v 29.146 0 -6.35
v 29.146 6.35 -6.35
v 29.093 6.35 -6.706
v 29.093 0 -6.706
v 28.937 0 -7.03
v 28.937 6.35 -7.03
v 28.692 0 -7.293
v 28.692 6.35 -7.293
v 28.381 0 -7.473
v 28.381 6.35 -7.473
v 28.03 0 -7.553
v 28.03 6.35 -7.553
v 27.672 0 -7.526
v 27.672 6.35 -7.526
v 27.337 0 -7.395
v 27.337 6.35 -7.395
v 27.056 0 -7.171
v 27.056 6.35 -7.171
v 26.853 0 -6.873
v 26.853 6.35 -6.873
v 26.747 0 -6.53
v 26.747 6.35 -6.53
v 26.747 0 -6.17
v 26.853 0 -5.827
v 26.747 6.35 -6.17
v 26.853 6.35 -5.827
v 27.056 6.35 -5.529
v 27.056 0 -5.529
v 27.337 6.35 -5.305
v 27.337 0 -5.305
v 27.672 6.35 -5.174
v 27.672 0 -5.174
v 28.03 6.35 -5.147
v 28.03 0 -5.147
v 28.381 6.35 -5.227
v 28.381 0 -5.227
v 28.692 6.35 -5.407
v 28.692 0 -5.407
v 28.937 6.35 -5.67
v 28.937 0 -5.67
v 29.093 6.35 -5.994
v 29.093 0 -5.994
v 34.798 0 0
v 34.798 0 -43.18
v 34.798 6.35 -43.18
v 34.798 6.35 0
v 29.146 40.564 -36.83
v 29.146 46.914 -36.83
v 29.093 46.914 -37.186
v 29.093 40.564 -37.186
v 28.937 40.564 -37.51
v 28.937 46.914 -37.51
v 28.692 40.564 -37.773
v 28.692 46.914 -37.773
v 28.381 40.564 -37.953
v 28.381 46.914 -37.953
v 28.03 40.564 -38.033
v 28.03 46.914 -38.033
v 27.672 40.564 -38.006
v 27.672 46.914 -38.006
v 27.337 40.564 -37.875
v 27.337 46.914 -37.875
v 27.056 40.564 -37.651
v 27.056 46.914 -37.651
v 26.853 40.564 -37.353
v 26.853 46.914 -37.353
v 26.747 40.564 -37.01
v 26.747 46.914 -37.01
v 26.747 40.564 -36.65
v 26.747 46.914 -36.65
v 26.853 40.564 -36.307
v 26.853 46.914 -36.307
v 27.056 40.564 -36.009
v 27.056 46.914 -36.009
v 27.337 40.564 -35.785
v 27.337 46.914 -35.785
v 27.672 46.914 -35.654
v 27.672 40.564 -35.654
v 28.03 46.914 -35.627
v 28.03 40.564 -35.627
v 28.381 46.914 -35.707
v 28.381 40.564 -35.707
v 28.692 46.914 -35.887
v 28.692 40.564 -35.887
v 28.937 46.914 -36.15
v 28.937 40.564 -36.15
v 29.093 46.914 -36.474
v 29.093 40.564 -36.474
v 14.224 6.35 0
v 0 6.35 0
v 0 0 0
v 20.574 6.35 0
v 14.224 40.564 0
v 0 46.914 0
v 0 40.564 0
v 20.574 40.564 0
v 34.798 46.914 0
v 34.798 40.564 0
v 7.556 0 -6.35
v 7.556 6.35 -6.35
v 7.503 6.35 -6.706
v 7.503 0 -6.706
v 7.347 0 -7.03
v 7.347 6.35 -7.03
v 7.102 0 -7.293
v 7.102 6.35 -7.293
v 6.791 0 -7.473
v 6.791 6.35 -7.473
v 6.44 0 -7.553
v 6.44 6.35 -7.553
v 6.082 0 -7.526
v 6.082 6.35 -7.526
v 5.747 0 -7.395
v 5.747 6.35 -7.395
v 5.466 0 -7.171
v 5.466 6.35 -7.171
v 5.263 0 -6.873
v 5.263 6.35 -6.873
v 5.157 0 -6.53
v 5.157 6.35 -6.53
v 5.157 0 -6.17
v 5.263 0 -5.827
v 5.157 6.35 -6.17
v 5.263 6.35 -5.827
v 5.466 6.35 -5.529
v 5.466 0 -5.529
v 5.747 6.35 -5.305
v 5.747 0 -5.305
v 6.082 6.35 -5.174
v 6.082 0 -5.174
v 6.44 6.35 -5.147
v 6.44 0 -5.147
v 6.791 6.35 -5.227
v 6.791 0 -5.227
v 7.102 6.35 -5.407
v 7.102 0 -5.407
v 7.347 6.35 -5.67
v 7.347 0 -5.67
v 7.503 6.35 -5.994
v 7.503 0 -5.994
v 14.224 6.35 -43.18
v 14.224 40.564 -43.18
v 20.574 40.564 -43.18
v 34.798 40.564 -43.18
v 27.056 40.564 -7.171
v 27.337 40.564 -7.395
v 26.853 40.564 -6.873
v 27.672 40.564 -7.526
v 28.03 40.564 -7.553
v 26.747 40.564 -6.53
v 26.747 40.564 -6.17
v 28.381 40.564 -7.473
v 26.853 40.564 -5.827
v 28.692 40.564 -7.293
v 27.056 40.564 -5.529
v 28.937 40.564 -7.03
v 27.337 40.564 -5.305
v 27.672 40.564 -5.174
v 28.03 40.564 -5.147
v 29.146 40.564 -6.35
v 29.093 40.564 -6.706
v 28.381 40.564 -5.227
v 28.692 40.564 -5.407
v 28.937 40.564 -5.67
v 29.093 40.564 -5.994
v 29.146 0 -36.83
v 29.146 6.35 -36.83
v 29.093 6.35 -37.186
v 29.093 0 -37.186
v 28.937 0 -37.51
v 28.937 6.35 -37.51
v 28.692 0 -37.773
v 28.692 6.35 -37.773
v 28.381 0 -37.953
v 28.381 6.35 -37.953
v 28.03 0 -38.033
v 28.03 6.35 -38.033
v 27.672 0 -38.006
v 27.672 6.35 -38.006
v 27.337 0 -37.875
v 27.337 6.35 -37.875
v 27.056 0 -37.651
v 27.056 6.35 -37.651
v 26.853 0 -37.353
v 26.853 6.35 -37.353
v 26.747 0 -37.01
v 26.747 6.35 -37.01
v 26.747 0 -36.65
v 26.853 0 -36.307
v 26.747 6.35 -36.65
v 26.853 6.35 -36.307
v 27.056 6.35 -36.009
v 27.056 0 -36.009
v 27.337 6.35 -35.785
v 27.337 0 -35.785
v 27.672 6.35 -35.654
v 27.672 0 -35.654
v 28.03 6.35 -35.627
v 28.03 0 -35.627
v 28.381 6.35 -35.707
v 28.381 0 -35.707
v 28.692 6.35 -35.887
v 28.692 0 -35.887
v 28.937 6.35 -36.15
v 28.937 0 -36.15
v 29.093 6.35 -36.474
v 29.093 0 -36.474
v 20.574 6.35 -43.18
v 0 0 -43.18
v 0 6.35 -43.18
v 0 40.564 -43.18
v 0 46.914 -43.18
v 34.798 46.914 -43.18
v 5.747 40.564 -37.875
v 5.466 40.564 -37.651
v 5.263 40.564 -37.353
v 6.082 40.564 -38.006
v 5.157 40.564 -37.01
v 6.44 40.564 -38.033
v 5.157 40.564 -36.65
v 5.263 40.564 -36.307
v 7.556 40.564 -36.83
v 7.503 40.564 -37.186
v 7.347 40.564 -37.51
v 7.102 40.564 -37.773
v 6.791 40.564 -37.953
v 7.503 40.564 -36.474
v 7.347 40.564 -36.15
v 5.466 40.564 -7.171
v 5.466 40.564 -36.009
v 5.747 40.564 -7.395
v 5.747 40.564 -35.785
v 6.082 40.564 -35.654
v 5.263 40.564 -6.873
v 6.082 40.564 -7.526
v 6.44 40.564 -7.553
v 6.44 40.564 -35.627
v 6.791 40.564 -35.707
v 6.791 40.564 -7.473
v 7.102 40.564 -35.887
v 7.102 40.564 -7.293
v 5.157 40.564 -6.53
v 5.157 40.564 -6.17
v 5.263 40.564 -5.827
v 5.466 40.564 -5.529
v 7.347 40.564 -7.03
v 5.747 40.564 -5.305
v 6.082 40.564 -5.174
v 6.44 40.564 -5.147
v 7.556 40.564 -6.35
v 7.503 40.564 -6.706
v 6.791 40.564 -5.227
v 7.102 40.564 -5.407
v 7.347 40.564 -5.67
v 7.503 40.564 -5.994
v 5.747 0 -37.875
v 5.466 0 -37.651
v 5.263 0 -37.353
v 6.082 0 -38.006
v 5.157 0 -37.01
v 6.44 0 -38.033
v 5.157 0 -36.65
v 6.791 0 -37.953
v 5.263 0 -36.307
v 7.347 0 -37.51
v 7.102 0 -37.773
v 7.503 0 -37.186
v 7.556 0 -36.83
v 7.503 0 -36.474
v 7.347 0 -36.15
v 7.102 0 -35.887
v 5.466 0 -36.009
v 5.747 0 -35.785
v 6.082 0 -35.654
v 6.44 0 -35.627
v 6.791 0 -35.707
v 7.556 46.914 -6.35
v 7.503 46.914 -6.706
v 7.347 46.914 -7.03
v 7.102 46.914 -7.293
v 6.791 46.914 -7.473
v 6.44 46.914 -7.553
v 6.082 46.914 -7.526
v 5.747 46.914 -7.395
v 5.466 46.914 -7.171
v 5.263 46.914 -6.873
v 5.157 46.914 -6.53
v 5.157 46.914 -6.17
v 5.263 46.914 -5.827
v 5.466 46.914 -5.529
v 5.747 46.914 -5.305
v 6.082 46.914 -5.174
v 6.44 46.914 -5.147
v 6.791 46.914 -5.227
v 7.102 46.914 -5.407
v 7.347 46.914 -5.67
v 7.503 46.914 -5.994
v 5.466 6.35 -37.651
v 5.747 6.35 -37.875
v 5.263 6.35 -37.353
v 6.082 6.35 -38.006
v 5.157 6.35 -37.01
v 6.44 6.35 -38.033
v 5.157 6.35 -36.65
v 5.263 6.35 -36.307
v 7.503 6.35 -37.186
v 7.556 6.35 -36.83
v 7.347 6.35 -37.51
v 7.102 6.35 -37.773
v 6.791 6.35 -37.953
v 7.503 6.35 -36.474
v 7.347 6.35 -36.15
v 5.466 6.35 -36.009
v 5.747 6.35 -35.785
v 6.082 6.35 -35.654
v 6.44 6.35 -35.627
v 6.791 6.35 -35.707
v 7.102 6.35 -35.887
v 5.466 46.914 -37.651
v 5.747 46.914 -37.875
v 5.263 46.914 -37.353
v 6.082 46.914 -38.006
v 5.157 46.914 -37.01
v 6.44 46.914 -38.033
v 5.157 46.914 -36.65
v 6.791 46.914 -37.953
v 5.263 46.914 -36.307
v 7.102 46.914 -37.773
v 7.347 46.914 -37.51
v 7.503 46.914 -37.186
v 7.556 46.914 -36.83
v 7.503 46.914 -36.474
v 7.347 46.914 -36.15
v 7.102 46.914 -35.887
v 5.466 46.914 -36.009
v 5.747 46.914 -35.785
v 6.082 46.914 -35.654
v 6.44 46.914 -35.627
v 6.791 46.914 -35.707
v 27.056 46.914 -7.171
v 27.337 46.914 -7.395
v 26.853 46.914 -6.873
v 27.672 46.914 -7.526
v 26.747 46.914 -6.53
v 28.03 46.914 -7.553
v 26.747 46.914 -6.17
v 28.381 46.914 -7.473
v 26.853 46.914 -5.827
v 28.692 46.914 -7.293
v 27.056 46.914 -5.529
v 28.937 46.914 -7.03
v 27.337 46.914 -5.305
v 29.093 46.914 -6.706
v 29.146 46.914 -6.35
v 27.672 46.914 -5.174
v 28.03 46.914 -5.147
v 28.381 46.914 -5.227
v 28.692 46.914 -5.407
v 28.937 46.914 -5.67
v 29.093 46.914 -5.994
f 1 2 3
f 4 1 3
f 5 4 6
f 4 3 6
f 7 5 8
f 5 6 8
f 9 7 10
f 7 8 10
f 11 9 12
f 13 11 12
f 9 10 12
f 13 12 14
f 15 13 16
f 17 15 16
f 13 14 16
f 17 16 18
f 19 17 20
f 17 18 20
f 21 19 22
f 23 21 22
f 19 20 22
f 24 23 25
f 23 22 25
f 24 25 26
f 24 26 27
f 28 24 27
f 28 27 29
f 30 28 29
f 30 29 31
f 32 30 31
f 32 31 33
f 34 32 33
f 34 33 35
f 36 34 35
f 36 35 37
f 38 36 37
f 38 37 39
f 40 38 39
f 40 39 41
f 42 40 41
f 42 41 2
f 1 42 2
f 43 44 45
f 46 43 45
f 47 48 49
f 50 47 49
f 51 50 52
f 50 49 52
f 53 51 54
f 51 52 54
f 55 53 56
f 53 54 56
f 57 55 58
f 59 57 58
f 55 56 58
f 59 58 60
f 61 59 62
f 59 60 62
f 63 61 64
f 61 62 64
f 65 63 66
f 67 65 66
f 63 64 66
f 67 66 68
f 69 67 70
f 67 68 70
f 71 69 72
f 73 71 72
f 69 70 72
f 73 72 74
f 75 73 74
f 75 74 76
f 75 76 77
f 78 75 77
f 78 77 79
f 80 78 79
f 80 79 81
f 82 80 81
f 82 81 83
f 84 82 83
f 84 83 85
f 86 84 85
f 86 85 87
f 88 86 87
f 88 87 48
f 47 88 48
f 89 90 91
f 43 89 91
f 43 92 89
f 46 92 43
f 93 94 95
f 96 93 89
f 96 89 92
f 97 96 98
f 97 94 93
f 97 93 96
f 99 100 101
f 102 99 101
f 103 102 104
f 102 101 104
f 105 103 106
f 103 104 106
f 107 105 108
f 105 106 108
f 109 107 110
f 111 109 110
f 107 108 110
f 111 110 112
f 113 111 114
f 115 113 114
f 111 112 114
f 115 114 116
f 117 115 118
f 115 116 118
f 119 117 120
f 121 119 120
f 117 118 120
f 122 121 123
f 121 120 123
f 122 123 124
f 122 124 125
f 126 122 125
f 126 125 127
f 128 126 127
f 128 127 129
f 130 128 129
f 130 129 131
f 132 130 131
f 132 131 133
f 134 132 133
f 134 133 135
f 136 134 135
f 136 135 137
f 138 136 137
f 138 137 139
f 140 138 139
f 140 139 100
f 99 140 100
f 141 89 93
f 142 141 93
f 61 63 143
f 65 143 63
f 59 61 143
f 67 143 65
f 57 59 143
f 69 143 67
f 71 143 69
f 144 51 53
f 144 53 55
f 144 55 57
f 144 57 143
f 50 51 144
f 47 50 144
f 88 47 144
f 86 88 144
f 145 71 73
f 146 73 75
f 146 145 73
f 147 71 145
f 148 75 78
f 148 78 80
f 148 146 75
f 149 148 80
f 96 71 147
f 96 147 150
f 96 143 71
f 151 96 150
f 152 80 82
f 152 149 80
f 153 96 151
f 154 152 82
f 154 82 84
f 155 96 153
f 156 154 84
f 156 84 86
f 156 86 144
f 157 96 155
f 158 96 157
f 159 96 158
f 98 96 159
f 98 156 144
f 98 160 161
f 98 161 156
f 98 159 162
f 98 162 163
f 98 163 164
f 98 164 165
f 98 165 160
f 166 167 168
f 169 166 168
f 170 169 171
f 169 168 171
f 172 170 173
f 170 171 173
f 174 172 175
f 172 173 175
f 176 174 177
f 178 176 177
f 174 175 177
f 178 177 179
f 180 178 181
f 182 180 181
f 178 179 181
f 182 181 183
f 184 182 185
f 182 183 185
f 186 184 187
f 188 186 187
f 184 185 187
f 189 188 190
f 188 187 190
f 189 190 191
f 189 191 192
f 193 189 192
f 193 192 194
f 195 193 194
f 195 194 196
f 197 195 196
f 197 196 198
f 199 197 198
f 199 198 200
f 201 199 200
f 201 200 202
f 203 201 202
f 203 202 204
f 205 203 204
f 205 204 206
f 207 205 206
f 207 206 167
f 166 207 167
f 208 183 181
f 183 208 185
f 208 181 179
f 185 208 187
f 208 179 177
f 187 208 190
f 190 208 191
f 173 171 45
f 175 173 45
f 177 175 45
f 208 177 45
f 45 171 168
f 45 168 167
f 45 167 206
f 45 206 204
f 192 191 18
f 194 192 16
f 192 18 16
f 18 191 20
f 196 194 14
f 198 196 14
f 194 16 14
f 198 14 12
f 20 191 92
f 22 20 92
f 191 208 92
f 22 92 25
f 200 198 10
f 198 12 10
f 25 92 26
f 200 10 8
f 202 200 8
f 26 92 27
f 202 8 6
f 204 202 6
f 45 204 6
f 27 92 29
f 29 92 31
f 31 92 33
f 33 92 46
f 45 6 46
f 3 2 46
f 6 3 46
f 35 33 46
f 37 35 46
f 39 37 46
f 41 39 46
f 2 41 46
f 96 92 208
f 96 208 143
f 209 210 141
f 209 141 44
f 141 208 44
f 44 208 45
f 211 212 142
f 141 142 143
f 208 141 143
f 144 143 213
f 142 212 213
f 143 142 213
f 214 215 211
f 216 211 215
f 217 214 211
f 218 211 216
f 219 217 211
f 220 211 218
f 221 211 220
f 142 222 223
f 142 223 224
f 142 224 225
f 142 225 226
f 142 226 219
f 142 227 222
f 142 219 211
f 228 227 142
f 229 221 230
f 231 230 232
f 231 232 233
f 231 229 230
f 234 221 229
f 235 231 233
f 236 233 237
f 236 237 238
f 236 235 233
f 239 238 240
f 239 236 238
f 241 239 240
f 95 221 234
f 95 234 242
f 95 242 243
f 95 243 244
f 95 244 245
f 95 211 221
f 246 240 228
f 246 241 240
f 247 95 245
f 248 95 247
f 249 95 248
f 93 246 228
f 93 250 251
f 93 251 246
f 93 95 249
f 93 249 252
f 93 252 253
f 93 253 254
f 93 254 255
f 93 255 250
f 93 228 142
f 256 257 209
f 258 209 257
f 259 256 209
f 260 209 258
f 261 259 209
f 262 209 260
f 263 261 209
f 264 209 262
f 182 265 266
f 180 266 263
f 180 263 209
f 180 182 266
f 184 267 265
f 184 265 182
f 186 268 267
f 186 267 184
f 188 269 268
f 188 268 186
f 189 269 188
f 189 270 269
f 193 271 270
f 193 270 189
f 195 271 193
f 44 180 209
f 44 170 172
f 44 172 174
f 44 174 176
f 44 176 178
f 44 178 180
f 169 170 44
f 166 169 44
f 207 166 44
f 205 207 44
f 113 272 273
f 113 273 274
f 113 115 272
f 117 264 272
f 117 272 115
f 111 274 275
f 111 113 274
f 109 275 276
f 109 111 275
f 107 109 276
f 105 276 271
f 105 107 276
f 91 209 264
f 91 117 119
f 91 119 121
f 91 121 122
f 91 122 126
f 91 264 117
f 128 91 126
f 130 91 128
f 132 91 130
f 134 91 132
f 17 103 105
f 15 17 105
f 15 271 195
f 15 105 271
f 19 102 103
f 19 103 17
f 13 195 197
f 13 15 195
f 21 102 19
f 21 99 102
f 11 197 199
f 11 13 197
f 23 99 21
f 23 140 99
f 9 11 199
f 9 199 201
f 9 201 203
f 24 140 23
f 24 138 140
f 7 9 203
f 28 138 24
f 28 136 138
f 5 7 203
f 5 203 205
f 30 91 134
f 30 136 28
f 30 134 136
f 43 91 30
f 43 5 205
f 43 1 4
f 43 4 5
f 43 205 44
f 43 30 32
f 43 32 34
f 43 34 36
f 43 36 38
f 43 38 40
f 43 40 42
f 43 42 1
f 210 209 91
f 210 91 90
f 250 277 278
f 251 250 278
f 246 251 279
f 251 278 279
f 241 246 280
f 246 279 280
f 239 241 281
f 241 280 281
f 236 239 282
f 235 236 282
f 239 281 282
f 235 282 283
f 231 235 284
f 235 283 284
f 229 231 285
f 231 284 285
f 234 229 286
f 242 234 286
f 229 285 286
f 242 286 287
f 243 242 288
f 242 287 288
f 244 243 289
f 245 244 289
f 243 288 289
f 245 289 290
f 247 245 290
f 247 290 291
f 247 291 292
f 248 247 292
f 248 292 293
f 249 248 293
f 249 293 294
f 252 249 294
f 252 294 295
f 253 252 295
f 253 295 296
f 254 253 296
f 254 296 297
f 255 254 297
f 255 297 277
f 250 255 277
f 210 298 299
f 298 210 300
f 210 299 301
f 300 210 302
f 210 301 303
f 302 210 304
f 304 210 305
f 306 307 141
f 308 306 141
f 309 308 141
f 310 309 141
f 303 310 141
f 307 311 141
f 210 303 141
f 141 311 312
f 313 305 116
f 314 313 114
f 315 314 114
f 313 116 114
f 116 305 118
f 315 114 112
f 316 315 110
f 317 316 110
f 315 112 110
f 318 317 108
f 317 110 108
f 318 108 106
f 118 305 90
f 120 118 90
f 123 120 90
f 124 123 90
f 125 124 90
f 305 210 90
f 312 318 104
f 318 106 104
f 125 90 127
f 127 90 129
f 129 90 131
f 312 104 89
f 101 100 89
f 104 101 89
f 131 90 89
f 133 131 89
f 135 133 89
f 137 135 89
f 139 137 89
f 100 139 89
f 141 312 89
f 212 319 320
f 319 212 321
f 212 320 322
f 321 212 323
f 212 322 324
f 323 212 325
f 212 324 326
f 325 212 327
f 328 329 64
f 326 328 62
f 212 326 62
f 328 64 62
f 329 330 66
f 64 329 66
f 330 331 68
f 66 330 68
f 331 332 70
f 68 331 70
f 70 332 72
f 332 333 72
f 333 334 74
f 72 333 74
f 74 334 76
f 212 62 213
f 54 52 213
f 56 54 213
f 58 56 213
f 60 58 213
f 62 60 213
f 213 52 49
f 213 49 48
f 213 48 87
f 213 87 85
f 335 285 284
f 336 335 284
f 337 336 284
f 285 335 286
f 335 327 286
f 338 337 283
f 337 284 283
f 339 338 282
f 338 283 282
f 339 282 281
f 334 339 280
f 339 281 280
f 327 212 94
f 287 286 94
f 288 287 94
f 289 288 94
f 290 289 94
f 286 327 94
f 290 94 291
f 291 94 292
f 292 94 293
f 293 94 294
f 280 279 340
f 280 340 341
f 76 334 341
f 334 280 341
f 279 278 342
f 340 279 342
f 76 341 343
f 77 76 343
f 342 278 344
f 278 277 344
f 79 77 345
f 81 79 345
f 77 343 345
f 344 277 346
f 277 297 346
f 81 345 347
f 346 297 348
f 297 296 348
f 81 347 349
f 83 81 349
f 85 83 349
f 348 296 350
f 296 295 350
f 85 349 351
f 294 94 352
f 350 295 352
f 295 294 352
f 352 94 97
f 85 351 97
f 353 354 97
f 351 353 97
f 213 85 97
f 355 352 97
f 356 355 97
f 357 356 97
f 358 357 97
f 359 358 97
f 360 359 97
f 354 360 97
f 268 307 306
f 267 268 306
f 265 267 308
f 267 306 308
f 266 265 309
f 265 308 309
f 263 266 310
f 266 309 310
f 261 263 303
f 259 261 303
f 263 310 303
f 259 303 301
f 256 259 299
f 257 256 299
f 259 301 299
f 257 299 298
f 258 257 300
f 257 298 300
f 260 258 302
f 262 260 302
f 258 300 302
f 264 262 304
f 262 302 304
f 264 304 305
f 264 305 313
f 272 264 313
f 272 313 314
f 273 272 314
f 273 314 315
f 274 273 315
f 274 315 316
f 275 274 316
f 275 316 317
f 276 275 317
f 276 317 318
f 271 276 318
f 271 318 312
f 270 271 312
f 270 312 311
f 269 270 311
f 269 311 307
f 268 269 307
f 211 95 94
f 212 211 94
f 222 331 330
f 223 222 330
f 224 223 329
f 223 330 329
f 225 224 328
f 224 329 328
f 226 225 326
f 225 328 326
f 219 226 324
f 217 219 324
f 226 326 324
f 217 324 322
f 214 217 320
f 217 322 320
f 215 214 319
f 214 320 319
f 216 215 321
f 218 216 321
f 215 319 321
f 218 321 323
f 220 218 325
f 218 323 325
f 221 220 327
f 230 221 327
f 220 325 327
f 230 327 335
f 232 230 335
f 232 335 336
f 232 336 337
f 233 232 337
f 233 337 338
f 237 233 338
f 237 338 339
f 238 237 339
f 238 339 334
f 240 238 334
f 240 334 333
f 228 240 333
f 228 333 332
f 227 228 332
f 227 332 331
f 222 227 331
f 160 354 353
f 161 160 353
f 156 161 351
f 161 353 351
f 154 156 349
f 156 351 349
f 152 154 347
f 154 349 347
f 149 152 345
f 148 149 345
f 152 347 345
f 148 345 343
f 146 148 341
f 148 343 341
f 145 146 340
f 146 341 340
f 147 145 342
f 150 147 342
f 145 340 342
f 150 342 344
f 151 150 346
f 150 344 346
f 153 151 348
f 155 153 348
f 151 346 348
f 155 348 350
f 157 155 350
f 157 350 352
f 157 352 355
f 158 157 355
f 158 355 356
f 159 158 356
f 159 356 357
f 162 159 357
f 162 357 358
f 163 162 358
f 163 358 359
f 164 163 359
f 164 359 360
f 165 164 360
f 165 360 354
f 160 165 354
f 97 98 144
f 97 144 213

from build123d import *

# Parameters (mm, degrees)
SKETCH1_W           = 34.798
SKETCH1_H           = 46.9138
BOSS_EXTRUDE1_DEPTH = 43.18
SKETCH2_W           = 14.224
SKETCH2_H           = 34.2138
CUT_EXTRUDE1_DEPTH  = 43.18
SKETCH3_R           = 1.2065
CUT_EXTRUDE2_DEPTH  = 47.9138


with BuildPart() as part:
    # Sketch1 → Boss-Extrude1 (new body)
    with BuildSketch(Plane.XY):
        with Locations((17.399, 23.4569)):
            Rectangle(SKETCH1_W, SKETCH1_H)
    extrude(amount=-BOSS_EXTRUDE1_DEPTH)

    # Sketch2 → Cut-Extrude1 (cut)
    with BuildSketch(Plane.XY):
        with Locations((7.112, 23.4569)):
            Rectangle(SKETCH2_W, SKETCH2_H)
        with Locations((27.686, 23.4569)):
            Rectangle(SKETCH2_W, SKETCH2_H)
    extrude(amount=-CUT_EXTRUDE1_DEPTH, mode=Mode.SUBTRACT)

    # Sketch3 → Cut-Extrude2 (cut, through all)
    with BuildSketch(Plane(origin=(0, 46.9138, 0), x_dir=(1, 0, 0), z_dir=(0, 1, 0))):
        with Locations((6.35, 6.35)):
            Circle(SKETCH3_R)
        with Locations((27.94, 6.35)):
            Circle(SKETCH3_R)
        with Locations((6.35, 36.83)):
            Circle(SKETCH3_R)
        with Locations((27.94, 36.83)):
            Circle(SKETCH3_R)
    extrude(amount=-CUT_EXTRUDE2_DEPTH, mode=Mode.SUBTRACT)


solid = part.part
